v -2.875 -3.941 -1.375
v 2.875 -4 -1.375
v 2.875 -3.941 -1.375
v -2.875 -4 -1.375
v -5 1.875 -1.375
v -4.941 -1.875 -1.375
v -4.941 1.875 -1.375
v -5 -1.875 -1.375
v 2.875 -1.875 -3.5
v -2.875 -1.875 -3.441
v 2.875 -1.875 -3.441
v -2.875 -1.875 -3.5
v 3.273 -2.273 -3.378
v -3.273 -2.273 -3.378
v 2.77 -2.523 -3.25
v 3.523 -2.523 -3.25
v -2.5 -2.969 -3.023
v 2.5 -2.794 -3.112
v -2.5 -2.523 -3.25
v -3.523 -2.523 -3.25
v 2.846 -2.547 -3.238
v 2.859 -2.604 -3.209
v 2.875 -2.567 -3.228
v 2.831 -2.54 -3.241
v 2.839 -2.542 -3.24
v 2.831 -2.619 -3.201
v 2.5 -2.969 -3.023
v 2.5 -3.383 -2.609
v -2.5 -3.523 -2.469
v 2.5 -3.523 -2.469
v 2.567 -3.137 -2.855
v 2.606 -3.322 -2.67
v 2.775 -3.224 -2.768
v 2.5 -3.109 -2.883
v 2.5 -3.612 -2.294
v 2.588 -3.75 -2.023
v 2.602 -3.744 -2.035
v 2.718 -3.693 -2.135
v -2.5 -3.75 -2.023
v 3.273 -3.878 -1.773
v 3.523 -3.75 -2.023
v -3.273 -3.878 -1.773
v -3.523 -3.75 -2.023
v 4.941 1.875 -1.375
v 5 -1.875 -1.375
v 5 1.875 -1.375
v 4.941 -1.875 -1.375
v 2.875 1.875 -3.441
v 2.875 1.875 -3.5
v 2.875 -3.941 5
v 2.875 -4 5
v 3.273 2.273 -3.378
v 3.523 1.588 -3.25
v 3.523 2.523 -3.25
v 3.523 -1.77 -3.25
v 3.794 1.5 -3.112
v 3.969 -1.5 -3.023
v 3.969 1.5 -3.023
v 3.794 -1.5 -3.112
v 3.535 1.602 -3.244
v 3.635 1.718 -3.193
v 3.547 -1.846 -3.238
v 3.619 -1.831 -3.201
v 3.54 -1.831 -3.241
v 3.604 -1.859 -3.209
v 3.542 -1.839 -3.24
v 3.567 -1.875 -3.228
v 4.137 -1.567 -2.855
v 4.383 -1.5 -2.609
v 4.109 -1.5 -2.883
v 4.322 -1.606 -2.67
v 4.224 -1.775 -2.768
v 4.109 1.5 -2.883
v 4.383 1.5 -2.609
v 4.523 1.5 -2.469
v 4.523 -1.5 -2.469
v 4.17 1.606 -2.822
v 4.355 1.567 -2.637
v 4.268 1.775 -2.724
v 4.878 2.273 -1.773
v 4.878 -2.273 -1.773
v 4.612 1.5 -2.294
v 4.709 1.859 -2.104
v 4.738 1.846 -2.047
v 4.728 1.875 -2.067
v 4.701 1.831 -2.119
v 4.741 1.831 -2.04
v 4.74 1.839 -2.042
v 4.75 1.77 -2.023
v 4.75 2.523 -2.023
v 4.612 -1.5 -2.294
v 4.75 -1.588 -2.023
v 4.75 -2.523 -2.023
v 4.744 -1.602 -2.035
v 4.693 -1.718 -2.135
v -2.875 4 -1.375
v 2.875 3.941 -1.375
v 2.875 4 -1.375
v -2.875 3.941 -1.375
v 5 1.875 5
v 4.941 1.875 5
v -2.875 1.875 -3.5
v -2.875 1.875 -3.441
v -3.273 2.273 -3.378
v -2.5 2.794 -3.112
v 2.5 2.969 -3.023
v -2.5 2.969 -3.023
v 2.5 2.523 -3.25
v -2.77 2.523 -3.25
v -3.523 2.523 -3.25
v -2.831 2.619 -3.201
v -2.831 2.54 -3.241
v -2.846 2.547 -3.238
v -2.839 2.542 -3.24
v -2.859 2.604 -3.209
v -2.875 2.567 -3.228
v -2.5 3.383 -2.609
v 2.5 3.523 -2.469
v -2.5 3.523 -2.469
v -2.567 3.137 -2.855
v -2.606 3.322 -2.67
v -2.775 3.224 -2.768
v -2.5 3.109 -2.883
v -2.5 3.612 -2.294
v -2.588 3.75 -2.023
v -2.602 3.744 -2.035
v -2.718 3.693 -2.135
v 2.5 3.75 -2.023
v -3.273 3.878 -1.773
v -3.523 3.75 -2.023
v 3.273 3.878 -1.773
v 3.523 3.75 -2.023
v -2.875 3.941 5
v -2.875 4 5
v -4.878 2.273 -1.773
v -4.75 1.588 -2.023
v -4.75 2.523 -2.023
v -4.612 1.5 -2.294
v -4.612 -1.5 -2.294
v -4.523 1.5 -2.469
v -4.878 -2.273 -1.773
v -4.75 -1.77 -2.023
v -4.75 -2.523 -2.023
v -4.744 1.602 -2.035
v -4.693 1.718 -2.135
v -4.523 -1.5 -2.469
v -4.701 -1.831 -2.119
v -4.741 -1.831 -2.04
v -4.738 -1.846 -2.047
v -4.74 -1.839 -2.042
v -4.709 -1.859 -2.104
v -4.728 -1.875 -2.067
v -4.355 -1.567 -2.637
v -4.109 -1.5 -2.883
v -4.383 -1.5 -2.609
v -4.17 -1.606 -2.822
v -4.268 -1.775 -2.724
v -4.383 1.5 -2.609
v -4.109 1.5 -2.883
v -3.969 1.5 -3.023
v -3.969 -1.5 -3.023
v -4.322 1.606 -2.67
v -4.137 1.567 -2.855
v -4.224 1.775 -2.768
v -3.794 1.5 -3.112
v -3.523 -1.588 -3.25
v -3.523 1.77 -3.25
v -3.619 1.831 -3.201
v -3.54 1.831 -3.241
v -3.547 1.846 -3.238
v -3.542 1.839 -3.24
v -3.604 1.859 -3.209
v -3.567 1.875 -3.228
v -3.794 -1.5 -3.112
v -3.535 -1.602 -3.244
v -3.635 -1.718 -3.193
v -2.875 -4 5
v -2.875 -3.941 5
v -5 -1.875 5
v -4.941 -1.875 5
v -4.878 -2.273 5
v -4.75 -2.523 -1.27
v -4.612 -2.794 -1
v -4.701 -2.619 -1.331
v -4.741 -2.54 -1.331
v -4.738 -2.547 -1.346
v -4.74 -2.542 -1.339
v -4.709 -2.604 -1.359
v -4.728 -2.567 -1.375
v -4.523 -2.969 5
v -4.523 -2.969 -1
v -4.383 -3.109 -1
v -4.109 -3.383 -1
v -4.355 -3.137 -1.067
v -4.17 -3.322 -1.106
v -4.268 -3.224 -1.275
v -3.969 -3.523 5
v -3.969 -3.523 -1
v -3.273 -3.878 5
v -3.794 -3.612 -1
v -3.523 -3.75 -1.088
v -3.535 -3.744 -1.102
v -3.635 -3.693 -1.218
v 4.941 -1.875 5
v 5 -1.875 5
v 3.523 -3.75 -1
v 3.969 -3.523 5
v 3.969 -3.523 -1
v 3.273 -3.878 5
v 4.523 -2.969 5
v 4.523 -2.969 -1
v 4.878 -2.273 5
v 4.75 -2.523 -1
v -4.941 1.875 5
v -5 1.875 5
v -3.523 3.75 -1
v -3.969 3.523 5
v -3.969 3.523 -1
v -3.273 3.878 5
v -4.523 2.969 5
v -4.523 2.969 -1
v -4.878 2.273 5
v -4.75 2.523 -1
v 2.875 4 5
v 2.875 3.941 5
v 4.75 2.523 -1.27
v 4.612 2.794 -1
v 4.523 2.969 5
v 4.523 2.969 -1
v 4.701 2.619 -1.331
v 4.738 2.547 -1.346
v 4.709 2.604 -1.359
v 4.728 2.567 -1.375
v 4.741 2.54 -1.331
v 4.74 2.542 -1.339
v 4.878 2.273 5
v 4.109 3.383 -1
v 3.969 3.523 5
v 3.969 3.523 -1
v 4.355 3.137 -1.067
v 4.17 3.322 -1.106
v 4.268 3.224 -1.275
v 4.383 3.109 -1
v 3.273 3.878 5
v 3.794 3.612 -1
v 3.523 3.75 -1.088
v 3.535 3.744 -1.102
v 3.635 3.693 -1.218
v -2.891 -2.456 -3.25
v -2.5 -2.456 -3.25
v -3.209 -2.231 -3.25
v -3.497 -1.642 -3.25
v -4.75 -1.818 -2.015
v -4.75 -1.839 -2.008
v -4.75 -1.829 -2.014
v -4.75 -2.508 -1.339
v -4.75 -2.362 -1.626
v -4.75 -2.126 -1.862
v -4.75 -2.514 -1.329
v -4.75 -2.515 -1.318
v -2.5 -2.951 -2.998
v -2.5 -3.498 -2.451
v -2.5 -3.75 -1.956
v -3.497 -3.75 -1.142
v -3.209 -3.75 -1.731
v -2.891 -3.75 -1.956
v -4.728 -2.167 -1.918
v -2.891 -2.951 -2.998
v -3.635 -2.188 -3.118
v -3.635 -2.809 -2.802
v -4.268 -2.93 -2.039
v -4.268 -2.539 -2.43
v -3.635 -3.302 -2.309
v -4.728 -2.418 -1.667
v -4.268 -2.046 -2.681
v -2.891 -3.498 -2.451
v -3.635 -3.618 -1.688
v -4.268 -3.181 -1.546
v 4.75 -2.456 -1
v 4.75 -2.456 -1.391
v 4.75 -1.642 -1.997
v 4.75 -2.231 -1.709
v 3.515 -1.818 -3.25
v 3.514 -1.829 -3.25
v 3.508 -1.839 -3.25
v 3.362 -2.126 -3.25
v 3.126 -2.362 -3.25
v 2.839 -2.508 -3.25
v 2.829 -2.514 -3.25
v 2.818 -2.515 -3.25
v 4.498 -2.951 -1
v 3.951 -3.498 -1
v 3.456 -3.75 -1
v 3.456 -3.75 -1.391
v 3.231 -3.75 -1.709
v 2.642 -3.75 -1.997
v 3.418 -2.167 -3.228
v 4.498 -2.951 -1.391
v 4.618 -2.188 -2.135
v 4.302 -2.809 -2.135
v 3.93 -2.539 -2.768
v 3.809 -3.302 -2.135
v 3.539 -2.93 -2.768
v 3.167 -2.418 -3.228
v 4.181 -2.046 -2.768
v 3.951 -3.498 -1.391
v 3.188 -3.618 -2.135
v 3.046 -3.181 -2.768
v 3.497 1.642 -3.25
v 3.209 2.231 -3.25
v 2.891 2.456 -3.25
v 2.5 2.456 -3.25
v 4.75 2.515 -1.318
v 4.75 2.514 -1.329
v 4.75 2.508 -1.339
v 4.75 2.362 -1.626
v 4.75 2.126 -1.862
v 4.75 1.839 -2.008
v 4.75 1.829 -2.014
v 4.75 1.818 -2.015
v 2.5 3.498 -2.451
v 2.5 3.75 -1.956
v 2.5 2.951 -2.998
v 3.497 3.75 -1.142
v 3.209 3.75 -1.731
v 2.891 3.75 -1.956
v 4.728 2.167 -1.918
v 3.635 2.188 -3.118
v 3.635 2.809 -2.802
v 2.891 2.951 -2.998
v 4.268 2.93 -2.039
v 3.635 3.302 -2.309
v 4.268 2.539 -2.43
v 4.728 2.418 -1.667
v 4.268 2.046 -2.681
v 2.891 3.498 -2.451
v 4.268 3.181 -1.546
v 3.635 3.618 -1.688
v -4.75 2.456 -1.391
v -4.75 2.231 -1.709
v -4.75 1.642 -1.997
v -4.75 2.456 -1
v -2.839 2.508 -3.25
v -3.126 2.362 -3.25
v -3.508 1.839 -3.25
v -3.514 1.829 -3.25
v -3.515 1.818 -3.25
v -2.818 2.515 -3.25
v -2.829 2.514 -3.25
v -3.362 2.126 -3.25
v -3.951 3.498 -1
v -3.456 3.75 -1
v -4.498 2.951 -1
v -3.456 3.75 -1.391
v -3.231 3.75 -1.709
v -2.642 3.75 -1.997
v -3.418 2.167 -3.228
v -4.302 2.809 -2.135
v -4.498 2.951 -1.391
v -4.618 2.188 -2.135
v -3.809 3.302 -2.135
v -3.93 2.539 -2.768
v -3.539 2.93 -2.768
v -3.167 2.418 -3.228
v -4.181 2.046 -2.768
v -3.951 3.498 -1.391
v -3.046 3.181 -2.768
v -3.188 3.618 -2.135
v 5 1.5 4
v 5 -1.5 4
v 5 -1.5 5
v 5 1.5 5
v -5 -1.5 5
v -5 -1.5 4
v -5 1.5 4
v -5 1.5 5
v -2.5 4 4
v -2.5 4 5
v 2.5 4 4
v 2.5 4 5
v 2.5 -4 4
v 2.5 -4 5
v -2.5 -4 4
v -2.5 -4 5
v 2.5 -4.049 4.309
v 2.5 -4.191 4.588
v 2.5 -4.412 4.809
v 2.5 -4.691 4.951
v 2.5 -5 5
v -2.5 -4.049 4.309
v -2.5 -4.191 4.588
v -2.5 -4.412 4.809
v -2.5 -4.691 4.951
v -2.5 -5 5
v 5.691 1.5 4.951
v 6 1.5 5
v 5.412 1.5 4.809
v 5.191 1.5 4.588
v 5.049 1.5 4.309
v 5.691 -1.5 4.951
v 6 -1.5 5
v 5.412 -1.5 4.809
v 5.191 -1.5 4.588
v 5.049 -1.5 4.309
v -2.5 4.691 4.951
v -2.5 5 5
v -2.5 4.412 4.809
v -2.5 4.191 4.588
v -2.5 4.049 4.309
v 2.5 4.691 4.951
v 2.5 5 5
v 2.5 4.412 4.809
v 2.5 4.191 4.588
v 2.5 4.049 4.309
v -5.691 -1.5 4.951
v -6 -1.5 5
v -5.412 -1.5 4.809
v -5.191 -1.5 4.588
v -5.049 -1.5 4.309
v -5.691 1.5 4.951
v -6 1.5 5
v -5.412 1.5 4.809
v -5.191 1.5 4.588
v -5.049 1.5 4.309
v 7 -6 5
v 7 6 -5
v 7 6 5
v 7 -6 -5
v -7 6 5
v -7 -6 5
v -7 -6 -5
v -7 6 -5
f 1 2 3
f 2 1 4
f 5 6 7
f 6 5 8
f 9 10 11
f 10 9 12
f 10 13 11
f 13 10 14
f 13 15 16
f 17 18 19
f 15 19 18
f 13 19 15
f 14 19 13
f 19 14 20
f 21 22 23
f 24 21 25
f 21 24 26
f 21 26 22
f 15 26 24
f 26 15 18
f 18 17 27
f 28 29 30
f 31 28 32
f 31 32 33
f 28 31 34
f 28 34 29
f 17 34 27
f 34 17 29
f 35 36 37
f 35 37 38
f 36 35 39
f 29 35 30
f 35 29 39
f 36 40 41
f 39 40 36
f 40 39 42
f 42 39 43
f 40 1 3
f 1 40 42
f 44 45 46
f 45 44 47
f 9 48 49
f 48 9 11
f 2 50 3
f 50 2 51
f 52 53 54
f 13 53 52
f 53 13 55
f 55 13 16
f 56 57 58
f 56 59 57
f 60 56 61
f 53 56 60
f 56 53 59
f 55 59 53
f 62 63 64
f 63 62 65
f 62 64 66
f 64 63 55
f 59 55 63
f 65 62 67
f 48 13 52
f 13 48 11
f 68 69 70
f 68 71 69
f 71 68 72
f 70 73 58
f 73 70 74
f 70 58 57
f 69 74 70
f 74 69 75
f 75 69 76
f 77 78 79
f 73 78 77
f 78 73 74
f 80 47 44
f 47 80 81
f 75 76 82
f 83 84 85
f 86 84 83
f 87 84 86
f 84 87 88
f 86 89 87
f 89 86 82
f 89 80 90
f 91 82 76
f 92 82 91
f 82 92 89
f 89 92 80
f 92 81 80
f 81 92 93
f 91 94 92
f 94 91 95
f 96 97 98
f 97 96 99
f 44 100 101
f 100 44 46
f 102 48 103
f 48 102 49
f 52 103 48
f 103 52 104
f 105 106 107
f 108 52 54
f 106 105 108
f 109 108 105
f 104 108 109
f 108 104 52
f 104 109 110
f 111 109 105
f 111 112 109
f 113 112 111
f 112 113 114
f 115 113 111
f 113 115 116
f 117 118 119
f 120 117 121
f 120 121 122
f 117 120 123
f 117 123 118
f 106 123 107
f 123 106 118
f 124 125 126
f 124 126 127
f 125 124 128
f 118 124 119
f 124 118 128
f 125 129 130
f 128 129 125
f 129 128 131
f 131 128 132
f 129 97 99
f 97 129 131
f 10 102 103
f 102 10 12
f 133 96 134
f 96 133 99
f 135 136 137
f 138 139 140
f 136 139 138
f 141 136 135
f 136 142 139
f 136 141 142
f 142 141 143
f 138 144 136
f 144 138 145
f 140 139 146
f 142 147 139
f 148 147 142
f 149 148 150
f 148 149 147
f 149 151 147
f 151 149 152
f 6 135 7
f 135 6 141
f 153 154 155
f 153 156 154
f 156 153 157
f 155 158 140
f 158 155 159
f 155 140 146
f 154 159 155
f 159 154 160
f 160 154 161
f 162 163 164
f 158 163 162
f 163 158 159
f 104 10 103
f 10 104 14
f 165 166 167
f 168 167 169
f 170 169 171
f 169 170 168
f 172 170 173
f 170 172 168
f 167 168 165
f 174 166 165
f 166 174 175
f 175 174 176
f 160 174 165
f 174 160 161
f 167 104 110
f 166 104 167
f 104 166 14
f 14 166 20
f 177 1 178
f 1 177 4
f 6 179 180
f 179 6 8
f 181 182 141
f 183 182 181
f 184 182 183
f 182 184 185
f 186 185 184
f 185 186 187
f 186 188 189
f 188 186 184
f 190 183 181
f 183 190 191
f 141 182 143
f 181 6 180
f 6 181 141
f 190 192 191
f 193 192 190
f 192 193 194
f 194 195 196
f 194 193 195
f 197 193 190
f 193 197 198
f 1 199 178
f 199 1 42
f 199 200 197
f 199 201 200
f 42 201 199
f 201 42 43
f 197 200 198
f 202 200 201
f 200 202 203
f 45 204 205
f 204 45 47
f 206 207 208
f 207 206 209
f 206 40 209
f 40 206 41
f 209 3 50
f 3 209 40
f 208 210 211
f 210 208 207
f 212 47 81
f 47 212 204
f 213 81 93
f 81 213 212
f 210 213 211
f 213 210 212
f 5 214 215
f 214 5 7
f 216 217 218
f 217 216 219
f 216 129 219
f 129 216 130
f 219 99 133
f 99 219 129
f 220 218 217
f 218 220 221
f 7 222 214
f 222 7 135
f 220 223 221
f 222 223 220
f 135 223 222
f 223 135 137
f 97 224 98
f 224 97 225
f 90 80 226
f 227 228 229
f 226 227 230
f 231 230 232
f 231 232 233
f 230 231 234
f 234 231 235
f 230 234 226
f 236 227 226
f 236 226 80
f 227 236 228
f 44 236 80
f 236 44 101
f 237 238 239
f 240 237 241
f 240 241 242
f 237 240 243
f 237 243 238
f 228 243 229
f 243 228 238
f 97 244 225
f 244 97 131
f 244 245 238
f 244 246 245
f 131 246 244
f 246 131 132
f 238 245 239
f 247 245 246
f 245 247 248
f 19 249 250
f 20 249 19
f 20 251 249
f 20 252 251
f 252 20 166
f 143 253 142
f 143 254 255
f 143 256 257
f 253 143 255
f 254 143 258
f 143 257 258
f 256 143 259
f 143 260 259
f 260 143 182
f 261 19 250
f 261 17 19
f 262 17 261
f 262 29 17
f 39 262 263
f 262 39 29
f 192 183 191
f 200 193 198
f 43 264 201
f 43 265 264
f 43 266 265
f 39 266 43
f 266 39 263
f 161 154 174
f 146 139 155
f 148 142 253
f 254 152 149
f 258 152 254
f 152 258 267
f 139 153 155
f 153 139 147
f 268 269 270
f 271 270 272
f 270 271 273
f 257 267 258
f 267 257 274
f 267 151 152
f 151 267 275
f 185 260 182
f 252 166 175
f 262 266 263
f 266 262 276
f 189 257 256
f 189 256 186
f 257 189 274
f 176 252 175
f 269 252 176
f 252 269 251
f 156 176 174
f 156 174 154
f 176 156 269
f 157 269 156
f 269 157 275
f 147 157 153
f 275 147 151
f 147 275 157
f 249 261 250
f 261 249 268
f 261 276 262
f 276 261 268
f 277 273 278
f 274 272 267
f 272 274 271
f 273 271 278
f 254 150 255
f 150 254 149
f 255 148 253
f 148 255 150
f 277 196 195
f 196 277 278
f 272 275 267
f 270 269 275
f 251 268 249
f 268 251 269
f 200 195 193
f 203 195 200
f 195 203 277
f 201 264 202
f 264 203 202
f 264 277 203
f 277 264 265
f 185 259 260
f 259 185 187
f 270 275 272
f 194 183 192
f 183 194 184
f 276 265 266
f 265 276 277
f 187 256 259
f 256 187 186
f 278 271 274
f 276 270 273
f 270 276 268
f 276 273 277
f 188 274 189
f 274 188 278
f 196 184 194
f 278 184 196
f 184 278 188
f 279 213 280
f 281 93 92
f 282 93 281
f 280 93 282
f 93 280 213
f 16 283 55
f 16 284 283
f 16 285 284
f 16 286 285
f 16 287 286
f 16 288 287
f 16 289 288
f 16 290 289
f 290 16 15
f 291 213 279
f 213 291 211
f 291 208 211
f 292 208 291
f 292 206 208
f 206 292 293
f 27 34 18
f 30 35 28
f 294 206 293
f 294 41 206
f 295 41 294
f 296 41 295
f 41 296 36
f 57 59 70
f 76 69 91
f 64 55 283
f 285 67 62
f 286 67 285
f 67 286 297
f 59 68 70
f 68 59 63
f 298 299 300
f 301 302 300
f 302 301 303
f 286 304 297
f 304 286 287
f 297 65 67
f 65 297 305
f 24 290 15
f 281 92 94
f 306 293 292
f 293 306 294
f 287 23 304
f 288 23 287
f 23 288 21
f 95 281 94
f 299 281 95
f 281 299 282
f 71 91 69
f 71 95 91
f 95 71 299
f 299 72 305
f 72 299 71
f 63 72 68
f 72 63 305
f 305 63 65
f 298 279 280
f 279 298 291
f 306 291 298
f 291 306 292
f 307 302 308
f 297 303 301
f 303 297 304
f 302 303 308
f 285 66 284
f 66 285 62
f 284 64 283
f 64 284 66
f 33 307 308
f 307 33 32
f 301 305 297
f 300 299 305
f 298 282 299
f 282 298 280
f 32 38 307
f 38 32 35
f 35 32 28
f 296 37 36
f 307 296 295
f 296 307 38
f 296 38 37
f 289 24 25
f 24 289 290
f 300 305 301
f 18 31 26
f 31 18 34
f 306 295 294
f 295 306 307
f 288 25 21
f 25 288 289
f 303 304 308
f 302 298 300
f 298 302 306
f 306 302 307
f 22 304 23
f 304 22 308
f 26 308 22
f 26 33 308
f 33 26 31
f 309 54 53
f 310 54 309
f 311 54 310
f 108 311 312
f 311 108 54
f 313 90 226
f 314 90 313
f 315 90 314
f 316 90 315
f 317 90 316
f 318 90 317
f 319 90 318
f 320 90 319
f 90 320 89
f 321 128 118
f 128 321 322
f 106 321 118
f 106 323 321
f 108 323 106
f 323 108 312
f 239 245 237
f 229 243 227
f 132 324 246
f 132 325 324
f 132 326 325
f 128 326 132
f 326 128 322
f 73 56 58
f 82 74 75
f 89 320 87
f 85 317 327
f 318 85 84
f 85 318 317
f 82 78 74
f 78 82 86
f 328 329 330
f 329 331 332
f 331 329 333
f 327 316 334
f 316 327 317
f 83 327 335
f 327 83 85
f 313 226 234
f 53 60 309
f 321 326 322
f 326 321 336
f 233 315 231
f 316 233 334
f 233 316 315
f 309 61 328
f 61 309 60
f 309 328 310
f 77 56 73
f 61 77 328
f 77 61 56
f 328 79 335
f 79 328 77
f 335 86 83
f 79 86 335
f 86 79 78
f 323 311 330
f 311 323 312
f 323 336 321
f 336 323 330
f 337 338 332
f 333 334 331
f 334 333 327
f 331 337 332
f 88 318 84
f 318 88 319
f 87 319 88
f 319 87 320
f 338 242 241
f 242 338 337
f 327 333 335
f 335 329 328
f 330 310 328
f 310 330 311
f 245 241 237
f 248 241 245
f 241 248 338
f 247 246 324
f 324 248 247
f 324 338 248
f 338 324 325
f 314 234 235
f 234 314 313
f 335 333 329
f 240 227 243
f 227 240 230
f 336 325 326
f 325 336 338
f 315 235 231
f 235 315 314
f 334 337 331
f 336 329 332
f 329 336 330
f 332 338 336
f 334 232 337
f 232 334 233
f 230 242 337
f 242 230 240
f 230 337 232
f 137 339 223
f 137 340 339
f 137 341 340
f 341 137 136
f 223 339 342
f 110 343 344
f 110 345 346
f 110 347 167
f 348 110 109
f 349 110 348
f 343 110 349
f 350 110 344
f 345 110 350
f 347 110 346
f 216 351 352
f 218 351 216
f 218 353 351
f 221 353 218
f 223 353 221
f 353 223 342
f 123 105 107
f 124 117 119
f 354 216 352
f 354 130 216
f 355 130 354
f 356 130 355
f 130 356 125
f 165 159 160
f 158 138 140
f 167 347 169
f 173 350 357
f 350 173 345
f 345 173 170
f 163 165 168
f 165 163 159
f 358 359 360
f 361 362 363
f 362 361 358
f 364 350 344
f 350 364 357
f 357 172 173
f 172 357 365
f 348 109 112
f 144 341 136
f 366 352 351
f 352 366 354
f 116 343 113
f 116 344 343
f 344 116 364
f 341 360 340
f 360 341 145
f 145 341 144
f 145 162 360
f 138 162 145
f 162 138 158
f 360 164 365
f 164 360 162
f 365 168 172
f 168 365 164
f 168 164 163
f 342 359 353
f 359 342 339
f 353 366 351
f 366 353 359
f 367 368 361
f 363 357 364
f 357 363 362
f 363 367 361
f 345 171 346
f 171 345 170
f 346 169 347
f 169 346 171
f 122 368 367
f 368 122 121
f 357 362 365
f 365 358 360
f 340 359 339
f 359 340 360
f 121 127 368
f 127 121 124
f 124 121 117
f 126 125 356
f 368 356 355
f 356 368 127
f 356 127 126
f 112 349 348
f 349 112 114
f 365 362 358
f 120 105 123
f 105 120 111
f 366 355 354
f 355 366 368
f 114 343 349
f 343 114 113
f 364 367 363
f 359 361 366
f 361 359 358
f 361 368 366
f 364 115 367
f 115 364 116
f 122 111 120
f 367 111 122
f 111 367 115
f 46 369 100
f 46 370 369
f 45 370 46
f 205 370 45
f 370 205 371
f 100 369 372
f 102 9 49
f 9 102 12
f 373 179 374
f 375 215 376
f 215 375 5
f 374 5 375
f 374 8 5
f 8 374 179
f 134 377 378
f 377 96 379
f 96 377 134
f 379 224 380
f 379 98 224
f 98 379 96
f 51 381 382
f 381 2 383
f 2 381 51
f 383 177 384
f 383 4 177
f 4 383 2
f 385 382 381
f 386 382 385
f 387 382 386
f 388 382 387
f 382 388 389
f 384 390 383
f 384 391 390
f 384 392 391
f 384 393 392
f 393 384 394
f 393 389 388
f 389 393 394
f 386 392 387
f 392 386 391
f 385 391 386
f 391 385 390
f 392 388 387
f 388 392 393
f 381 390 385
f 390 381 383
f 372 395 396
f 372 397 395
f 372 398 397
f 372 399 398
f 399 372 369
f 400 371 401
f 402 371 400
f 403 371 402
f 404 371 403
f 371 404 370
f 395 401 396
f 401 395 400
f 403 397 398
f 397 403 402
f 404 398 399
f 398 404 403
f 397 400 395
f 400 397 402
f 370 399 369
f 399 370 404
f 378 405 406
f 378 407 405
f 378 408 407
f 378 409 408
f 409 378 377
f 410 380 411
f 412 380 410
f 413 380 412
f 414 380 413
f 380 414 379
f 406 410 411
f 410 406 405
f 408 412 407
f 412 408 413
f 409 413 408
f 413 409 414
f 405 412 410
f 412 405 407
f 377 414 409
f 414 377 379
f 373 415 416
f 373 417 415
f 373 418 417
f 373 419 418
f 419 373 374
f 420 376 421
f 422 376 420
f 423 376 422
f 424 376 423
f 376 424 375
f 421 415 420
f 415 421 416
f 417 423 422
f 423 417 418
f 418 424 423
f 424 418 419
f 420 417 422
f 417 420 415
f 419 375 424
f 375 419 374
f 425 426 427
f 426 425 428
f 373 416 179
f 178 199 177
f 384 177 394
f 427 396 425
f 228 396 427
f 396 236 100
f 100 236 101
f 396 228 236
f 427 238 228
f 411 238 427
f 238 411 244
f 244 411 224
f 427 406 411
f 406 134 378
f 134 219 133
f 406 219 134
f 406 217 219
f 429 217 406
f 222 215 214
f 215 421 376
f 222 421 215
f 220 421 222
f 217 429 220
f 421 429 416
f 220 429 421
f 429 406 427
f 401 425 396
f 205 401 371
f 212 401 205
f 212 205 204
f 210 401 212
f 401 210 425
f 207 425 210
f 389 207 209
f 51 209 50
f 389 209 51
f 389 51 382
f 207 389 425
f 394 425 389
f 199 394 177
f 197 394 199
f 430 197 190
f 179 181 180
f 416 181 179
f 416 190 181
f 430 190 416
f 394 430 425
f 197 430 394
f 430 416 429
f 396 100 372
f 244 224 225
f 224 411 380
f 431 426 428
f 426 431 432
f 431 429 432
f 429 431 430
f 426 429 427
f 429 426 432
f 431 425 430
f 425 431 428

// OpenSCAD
$fn=20;

module rcube(size=[1,1,1], center=false, radius=1, debug=false,
		bo, ce, to,
		fr, ri, ba, le,
		bf, br, bb, bl,
		cfl, cfr, cbr, cbl,
		tf, tr, tb, tl) {
		
	// define all values
	bo = bo == undef ? true : bo;
	ce = ce == undef ? true : ce;
	to = to == undef ? true : to;
	
	fr = fr == undef ? true : fr;
	ri = ri == undef ? true : ri;
	ba = ba == undef ? true : ba;
	le = le == undef ? true : le;
	
	bf = bf == undef ? (bo && fr) : bf;
	br = br == undef ? (bo && ri) : br;
	bb = bb == undef ? (bo && ba) : bb;
	bl = bl == undef ? (bo && le) : bl;
	cfl = cfl == undef ? (ce && fr && le) : cfl;
	cfr = cfr == undef ? (ce && fr && ri) : cfr;
	cbr = cbr == undef ? (ce && ba && ri) : cbr;
	cbl = cbl == undef ? (ce && ba && le) : cbl;
	tf = tf == undef ? (to && fr) : tf;
	tr = tr == undef ? (to && ri) : tr;
	tb = tb == undef ? (to && ba) : tb;
	tl = tl == undef ? (to && le) : tl;
	
	module roundEdge(length, translation=[0,0,0], rotation=[0,0,0]) {
		translate(translation) {
			rotate(rotation) {
				difference() {
					translate([(radius)/2 + 1/4,(radius)/2 + 1/4,0]) {
						cube([radius/2 + 1, radius/2 + 1, length + 4], center=true);
					}
					cylinder(h=length + 2, r=radius, center=true);
				}
			}
		}
	}
	module roundFullCorner(translation=[0,0,0], rotation=[0,0,0]) {
		translate(translation) {
			rotate(rotation) {
				difference() {
					cube([radius/2 + 1, radius/2 + 1, radius/2 + 1]);
					sphere(r=radius);
				}
			}
		}			
	}
	
	if(debug) {
		cube(size=size, center=center);
	} else {
	
		translation = center ? [0,0,0] : size / 2;
	
		translate(translation) {
	
			difference() {
				cube(size=size, center=true);
		
				union() {
					x = size[0];
					y = size[1];
					z = size[2];
			
					// edges
					if(bf) {
						roundEdge(x,[0,-y/2 + radius,-z/2 + radius],[180,90,0]);
					}
					if(br) {
						roundEdge(y,[x/2 - radius,0,-z/2 + radius],[90,90,0]);
					}
					if(bb) {
						roundEdge(x,[0,y/2 - radius,-z/2 + radius],[0,90,0]);
					}
					if(bl) {
						roundEdge(y,[-x/2 + radius,0,-z/2 + radius],[90,180,0]);
					}
					if(cfl) {
						roundEdge(z,[-x/2 + radius,-y/2 + radius,0],[0,0,180]);
					}
					if(cfr) {
						roundEdge(z,[x/2 - radius,-y/2 + radius,0],[0,0,270]);
					}
					if(cbl) {
						roundEdge(z,[-x/2 + radius,y/2 - radius,0],[0,0,90]);
					}
					if(cbr) {
						roundEdge(z,[x/2 - radius,y/2 - radius,0],[0,0,0]);
					}
					if(bf) {
						roundEdge(x,[0,-y/2 + radius,-z/2 + radius],[180,90,0]);
					}
					if(tf) {
						roundEdge(x,[0,-y/2 + radius,z/2 - radius],[180,270,0]);
					}
					if(tr) {
						roundEdge(y,[x/2 - radius,0,z/2 - radius],[270,270,0]);
					}
					if(tb) {
						roundEdge(x,[0,y/2 - radius,z/2 - radius],[0,270,0]);
					}
					if(tl) {
						roundEdge(y,[-x/2 + radius,0,z/2 - radius],[270,180,0]);
					}

					// corners
					if(bf && bl && cfl) {
						roundFullCorner([-x/2 + radius,-y/2 + radius,-z/2 + radius], [180,90,0]);
					}
					if(bf && br && cfr) {
						roundFullCorner([x/2 - radius,-y/2 + radius,-z/2 + radius], [180,0,0]);
					}
					if(bb && br && cbr) {
						roundFullCorner([x/2 - radius,y/2 - radius,-z/2 + radius], [0,90,0]);
					}
					if(bb && bl && cbl) {
						roundFullCorner([-x/2 + radius,y/2 - radius,-z/2 + radius], [0,180,0]);
					}
					if(tf && tl && cfl) {
						roundFullCorner([-x/2 + radius,-y/2 + radius,z/2 - radius], [0,0,180]);
					}
					if(tf && tr && cfr) {
						roundFullCorner([x/2 - radius,-y/2 + radius,z/2 - radius], [0,0,270]);
					}
					if(tb && tr && cbr) {
						roundFullCorner([x/2 - radius,y/2 - radius,z/2 - radius], [0,0,0]);
					}
					if(tb && tl && cbl) {
						roundFullCorner([-x/2 + radius,y/2 - radius,z/2 - radius], [0,0,90]);
					}
				}
			}
		}
	}
}

module rInnerTopCube(size=[1,1,1], center=false, radius=1, radius1, radius2, debug=false,
		f=true, r=true, b=true, l=true, convexity=10, $fn=$fn) {

	// define radius1 and radius2
	radius1 = radius1 == undef ? radius : radius1;
	radius2 = radius2 == undef ? radius : radius2;

	module roundEdge(length, translation=[0,0,0], rotation=[0,0,0]) {
		translate(translation) {
			rotate(rotation) {
				difference() {
					translate([-1/2,0,0]) {
						cube([radius1 + 1, 2*radius1, length], center=true);
					}
					translate([radius1/2,-radius1,0]) {
						cylinder(h=length, r=radius1, center=true);
					}
				}
			}
		}
	}
	module roundCorner1(translation=[0,0,0], rotation=[0,0,0]) {
		translate(translation) {
			rotate(rotation) {
				if (radius1 > radius2) {
					difference() {
						cube([2*radius1 + 1,2*radius1 + 1,radius1 + 1]);
						union() {
							translate([0,-1,0]) {
								rotate([270,0,0]) {
									cylinder(h=2*radius1 + 3, r=radius1);
								}
							}
							translate([-1,,0]) {
								rotate([0,90,0]) {
									cylinder(h=2*radius1 + 3, r=radius1);
								}
							}
						}
					}
				}
			}
		}
	}
	module roundCorner2(translation=[0,0,0], rotation=[0,0,0]) {
		if (radius2 > 0) {
			translate(translation) {
				rotate(rotation) {
					intersection() {
						translate([-radius1-radius2,-radius1-radius2,0]) {
							cube([radius1+radius2+1,radius1+radius2+1,radius2 + 1]);
						}
						difference() {
							translate([0,0,-1]) {
								cylinder(h=radius2 + 3, r=radius1+radius2);
							}
							rotate_extrude(convexity=convexity) {
								translate([radius1+radius2,0,0]) {
									circle(r=radius1, $fn=$fn);
								}
							}
						}
					}
				}
			}
		}
	}
	
	function pos1(pos) = pos > 0 ? pos + radius1 : pos - radius1;
	function pos2(pos) = pos > 0 ? pos - radius2 : pos + radius2;

	module roundCorner(translation=[0,0,0], rotation=[0,0,0]) {
		intersection() {
			roundCorner1([pos1(translation[0]), pos1(translation[1]), translation[2]], rotation);
			roundCorner2([pos2(translation[0]), pos2(translation[1]), translation[2]], rotation);
		}
	}

	function rFR() = (f && r == true) ? true : false;
	function rRB() = (r && b == true) ? true : false;
	function rBL() = (b && l == true) ? true : false;
	function rLF() = (l && f == true) ? true : false;
	
	function longerRadius() = radius1 > radius2 ? radius1 : radius2;
	
	function edgeLength(length, c1, c2) = (c1 == true) ? ((c2 == true) ? length - 2*longerRadius() : length - longerRadius()) : ((c2 == true) ? length - longerRadius() : length);
	
	function edgePosition(c1, c2) = (c1 == c2) ? 0 : ((c1 == true) ? 1*longerRadius()/2 : -longerRadius()/2);

	if(!debug) {
		x = size[0];
		y = size[1];
		z = size[2];
		
		union() {
			// edges
			if(f) {
				roundEdge(edgeLength(x, rFR(), rLF()),[edgePosition(rLF(), rFR()),-y/2,(z-radius1)/2],[0,90,0]);
			}
			if(r) {
				roundEdge(edgeLength(y, rFR(), rRB()),[x/2,edgePosition(rFR(), rRB()),(z-radius1)/2],[270,90,0]);
			}
			if(b) {
				roundEdge(edgeLength(x, rRB(), rBL()),[edgePosition(rBL(), rRB()),y/2,(z-radius1)/2],[180,90,0]);
			}
			if(l) {
				roundEdge(edgeLength(y, rBL(), rLF()),[-x/2,edgePosition(rLF(), rBL()),(z-radius1)/2],[90,90,0]);
			}
			// corners
			if(rFR()) {
				roundCorner([x/2,-y/2,z/2-radius1], [0,0,90]);
			}
			if(rRB()) {
				roundCorner([x/2,y/2,z/2-radius1], [0,0,180]);
			}
			if(rBL()) {
				roundCorner([-x/2,y/2,z/2-radius1], [0,0,270]);
			}
			if(rLF()) {
				roundCorner([-x/2,-y/2,z/2-radius1], [0,0,0]);
			}
		}
	}
}

radius = 2;

debug = true;
difference() {
	rcube([14,12,10], radius=radius, debug=debug, center=true);
	union() {
		translate([0,0,1]) {
			rcube([10,8,9], radius=2.5, bo=true, to=false, fr=true, le=true, debug=false, center=true);
		}
		rInnerTopCube([10,8,10], f=true, l=true, radius1 = 1, radius2=2.5, debug=false, center=true);
	}
}
